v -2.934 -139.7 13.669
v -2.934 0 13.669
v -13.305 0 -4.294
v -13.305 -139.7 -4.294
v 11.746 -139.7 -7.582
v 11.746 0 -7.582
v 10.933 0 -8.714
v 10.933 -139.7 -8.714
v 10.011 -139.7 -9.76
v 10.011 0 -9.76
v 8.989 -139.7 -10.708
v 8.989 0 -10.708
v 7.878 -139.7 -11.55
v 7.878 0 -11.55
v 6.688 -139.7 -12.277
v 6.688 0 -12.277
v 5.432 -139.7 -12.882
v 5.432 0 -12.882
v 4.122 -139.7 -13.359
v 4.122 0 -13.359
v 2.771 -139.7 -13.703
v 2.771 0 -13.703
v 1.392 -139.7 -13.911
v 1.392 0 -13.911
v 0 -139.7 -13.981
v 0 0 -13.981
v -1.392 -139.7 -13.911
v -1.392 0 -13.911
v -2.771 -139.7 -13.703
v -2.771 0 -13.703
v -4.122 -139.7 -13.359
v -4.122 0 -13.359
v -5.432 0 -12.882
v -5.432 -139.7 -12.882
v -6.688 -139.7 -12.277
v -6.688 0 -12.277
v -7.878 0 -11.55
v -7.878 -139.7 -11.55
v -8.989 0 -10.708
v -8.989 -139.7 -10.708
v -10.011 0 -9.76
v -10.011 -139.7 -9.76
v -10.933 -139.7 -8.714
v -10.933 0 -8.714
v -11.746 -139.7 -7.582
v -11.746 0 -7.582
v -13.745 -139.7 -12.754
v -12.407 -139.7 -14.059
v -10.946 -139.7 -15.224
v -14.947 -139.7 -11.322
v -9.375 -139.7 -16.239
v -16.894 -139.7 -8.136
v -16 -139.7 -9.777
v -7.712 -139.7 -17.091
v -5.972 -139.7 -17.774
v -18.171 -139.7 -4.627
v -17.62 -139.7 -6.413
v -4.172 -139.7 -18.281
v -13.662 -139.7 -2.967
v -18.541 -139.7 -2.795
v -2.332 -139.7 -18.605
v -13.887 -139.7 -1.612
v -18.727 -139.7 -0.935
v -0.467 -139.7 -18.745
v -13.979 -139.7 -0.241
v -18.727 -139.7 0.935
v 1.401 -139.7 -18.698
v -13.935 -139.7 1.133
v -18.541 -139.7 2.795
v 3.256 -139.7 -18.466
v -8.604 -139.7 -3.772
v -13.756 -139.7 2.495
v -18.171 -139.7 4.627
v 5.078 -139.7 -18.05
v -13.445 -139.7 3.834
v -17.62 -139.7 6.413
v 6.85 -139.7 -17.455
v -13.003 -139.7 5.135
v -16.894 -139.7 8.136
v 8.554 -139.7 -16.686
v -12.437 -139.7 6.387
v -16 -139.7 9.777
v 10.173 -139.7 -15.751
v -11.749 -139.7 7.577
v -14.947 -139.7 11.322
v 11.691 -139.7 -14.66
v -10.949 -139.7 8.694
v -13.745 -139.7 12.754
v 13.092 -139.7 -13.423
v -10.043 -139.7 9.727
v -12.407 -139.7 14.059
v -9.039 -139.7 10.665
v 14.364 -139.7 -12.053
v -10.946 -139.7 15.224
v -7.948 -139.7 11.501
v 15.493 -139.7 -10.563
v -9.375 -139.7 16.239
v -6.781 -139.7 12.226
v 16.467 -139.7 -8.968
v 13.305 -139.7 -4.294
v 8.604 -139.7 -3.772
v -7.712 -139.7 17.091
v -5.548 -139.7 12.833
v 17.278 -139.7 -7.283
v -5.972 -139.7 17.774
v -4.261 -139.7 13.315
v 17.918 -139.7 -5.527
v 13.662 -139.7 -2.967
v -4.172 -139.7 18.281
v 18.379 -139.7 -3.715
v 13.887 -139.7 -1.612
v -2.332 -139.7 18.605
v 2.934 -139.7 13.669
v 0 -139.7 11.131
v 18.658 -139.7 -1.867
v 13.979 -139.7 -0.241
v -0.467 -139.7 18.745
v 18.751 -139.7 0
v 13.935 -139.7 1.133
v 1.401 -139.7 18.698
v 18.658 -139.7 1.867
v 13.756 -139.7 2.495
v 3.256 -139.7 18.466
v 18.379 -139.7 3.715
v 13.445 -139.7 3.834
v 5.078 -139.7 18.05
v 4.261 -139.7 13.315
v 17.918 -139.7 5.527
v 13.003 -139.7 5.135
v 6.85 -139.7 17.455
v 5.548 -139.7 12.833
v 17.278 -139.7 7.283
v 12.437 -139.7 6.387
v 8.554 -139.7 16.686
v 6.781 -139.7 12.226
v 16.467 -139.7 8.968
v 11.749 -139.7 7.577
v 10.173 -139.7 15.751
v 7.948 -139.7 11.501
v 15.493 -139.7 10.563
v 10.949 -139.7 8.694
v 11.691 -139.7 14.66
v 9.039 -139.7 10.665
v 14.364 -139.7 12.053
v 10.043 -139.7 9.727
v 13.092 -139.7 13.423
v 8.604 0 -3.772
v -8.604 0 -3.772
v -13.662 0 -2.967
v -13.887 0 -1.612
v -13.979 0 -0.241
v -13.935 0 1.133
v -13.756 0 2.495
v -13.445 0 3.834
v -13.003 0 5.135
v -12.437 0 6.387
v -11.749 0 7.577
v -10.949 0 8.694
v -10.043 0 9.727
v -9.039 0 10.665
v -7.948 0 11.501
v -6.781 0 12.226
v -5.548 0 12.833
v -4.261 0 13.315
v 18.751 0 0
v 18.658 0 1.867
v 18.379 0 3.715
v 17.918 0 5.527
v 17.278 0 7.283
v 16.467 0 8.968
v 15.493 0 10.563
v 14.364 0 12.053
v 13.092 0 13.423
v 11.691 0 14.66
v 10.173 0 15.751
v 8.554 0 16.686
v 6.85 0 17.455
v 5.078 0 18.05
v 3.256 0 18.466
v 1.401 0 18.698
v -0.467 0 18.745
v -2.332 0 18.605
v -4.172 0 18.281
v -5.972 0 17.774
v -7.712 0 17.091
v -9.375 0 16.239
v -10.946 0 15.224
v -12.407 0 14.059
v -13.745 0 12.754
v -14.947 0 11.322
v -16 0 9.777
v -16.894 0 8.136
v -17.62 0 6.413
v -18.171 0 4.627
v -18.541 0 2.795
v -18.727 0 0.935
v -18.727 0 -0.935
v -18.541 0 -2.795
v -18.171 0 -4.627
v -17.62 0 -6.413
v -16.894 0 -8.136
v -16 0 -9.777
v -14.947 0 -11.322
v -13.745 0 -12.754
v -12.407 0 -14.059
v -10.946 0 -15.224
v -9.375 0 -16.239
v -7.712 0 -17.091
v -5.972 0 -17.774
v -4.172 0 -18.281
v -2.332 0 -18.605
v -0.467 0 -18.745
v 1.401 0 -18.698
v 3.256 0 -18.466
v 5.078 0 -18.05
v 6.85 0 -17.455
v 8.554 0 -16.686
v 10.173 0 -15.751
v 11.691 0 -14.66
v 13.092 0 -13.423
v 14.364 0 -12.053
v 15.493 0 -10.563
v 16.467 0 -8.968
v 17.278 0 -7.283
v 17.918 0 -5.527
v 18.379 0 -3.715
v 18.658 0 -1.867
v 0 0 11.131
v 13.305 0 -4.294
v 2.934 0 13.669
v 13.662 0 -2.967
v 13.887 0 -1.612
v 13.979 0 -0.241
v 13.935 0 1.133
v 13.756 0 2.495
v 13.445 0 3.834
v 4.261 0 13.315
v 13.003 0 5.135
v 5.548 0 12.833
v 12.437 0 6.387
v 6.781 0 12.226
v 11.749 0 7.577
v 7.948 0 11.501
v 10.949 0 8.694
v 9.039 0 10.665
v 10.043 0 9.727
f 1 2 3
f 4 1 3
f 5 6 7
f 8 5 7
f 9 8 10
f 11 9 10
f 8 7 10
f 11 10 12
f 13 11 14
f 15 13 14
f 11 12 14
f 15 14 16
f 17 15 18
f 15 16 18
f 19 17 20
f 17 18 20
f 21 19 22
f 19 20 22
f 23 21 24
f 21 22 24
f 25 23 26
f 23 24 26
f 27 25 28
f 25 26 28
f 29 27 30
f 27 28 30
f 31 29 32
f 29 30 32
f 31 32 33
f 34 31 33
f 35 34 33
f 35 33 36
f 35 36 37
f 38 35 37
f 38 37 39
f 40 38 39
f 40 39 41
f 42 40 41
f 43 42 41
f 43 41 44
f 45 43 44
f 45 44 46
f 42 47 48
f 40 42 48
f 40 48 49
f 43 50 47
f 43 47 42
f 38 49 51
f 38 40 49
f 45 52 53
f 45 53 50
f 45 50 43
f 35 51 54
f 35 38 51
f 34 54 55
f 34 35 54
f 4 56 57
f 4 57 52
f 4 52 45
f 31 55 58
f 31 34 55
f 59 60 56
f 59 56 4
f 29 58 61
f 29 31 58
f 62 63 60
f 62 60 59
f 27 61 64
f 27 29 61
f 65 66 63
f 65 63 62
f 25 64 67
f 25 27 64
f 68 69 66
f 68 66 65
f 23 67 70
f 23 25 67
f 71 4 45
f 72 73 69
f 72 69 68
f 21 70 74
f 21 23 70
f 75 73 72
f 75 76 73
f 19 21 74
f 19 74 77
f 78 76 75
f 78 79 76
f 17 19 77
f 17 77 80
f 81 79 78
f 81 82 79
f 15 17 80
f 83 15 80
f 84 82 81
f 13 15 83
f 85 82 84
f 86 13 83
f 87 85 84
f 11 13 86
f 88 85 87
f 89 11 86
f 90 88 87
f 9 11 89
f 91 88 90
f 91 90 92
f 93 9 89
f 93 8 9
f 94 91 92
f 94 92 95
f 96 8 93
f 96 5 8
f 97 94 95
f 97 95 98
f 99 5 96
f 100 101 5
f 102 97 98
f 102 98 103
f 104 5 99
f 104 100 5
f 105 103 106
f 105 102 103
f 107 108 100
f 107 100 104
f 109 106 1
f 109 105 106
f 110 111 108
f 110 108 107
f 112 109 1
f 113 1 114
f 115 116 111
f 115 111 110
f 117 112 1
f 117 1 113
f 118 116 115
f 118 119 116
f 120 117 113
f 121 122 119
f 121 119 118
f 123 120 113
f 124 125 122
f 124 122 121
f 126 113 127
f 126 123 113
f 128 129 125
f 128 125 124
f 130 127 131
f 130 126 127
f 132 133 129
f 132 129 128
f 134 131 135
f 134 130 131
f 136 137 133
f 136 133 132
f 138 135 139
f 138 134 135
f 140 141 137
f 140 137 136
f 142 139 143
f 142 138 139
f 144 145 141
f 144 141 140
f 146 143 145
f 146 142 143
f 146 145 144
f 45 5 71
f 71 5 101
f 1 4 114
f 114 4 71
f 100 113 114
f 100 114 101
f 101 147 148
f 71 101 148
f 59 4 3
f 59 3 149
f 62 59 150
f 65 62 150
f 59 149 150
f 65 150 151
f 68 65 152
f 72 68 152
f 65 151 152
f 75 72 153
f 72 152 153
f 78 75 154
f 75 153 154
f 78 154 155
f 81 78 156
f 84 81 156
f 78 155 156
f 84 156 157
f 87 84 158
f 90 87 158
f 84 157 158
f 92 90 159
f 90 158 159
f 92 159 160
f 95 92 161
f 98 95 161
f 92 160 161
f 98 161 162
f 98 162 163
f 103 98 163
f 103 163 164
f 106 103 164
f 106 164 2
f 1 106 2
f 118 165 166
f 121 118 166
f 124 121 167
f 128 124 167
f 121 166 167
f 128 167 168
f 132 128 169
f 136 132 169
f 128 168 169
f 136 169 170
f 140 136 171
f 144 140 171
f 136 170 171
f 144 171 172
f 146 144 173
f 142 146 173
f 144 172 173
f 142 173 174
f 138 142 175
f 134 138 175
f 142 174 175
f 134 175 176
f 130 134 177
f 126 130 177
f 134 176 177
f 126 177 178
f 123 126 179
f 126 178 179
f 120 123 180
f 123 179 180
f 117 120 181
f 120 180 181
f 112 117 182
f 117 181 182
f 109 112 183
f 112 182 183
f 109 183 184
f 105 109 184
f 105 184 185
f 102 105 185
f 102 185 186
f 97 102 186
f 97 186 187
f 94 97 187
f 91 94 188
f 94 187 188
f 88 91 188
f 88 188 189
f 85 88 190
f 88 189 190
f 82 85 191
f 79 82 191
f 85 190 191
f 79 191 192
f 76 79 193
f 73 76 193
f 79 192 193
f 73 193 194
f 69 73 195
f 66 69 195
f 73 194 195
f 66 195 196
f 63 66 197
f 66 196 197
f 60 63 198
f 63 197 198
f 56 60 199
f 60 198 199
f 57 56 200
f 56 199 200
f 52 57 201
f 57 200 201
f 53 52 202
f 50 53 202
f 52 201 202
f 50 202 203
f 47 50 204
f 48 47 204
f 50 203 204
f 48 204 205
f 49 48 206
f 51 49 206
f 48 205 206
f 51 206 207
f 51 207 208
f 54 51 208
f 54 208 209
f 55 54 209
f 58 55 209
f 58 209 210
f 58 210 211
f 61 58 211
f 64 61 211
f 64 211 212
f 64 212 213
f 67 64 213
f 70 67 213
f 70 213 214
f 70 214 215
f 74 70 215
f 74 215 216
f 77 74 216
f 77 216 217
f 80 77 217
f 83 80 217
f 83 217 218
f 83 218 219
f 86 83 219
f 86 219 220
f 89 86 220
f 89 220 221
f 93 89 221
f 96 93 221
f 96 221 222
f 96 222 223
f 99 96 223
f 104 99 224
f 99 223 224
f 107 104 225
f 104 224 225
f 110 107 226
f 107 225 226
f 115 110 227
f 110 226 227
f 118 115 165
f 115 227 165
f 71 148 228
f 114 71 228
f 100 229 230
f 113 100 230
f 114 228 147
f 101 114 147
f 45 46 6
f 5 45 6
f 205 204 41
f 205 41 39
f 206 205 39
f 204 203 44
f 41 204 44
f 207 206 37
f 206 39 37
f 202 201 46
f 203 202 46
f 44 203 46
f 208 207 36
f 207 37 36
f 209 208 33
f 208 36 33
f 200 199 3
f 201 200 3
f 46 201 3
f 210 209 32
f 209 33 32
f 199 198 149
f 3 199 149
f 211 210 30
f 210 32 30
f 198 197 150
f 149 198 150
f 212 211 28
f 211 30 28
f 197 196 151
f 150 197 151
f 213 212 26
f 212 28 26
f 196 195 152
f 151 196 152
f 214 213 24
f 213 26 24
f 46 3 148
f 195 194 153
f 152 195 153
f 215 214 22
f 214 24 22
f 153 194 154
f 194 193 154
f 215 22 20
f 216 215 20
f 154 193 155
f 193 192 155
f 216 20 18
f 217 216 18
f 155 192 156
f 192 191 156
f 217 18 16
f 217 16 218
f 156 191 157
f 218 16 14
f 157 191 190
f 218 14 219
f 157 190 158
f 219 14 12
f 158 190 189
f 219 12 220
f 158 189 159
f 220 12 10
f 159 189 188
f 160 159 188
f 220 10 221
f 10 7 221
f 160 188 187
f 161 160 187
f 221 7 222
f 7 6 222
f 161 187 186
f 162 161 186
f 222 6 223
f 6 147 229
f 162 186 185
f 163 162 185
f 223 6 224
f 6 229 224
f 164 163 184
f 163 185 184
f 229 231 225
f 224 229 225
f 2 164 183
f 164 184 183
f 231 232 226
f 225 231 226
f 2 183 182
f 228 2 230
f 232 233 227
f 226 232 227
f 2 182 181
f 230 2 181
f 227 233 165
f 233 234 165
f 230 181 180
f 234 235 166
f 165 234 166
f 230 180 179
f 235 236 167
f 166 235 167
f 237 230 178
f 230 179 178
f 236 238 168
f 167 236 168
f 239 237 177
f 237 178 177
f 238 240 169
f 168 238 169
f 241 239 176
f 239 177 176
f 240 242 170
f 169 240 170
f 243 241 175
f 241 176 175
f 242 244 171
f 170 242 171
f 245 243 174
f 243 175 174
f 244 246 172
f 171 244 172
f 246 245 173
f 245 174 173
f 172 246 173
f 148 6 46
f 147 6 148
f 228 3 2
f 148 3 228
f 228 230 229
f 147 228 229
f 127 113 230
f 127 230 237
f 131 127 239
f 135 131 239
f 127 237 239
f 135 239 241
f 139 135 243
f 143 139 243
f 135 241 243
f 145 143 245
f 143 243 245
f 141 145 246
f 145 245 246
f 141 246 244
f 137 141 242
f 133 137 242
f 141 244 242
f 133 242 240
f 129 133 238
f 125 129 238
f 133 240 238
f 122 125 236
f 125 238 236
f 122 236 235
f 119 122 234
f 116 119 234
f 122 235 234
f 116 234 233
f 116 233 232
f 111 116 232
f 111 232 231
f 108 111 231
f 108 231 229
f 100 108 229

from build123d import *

# Parameters (mm, degrees)
F0_R     = 18.7507393172
F0_W     = 2.8121968498
F0_H     = 2.6235150942
F1_DEPTH = 139.7


# Not quite as in the source:
# - a feature names something its author has since deleted; it is built from what else it names


with BuildPart() as f1:
    # F0 (on Front) → F1 (new body)
    with BuildSketch(Plane.XZ):
        Circle(F0_R)
        with BuildLine():
            ThreePointArc((11.7463163557, -7.5817653145), (0, -13.9806692691), (-11.7463163557, -7.5817653145))
            Line((-11.7463163557, -7.5817653145), (11.7463163557, -7.5817653145))
        make_face(mode=Mode.SUBTRACT)
        with BuildLine():
            ThreePointArc((-13.3049026907, -4.2940281328), (-12.107614749, 6.9903346346), (-2.9337138978, 13.6693977914))
            Line((-2.9337138978, 13.6693977914), (-13.3049026907, -4.2940281328))
        make_face(mode=Mode.SUBTRACT)
        with Locations((-0.1412869315, 14.9811553385)):
            Rectangle(F0_W, F0_H, mode=Mode.SUBTRACT)
        Polygon((-8.6039650607, -3.7717653145), (0, 11.1307393172), (8.6039650607, -3.7717653145), align=None, mode=Mode.SUBTRACT)
        with BuildLine():
            ThreePointArc((2.9337138978, 13.6693977914), (12.107614749, 6.9903346346), (13.3049026907, -4.2940281328))
            Line((13.3049026907, -4.2940281328), (2.9337138978, 13.6693977914))
        make_face(mode=Mode.SUBTRACT)
        with Locations((-0.1412869315, 14.9811553385)):
            Rectangle(F0_W, F0_H)
    extrude(amount=F1_DEPTH)


solid = f1.part
